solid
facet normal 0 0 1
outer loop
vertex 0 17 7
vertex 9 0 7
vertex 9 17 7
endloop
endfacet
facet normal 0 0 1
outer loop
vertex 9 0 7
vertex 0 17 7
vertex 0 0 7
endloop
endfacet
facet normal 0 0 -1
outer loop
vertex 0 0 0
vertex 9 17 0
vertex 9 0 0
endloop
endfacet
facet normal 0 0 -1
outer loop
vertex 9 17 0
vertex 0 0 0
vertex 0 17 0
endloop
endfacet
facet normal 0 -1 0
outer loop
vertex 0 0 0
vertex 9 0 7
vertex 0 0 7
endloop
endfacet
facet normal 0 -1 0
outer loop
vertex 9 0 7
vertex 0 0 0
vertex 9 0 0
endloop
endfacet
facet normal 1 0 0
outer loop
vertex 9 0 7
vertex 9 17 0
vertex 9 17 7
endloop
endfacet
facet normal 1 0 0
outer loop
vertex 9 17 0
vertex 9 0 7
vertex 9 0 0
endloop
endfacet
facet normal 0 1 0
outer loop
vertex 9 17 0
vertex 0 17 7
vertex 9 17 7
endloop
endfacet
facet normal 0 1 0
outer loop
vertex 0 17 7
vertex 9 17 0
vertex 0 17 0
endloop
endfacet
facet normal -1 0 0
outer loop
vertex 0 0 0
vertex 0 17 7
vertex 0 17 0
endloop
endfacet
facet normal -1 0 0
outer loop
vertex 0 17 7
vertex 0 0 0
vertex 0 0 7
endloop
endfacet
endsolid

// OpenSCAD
// Generated by SolidPython 1.0.1 on 2020-07-29 00:46:55


cube(size = [9, 17, 7]);
/***********************************************
*********      SolidPython code:      **********
************************************************
 
# import packages: SolidPython
from solid import *
from solid.utils import *
from itertools import chain, combinations, permutations


class Resize:

    def __init__(self, scad_file):
        self.scad_file = scad_file
        #self.scad_file = import_scad(scad_file)
        # cone/cylinder param:
        self.r1 = 0
        self.r2 = 0
        self.h = 0
        # rectangular prism param:
        self.w = 0
        self.l = 0
        # ellipse param:
        self.r = 0

    # import OpenScad code (file name corresponds to shape)


    # classify shape + parameters
    def assign(self, param1, param2, param3):
        if self.scad_file == 'cone.scad':
            self.r1 = param1
            self.r2 = param2
            self.h = param3
        elif self.scad_file == 'cylinder.scad':
            self.r1 = param1
            self.r2 = param2
            self.h = param3
        elif self.scad_file == 'rectangularPrism.scad':
            self.h = param1
            self.l = param2
            self.w = param3
        else:
            self.r = param1
            self.h = param2

    # resize parameters
    def iterate(self):
        x = range(3, 20, 2)
        i = 1
        if self.scad_file == 'cone.scad':
            tempList = list(permutations(x, 2))
            for temp in tempList:
                param1 = temp[0]
                param2 = temp[1]
                filepath = 'produced_scad_files/' + 'cone' + str(param1) + '_' + str(param2) + '_' + '.scad'
                scad_render_to_file(cylinder(h=param1, r1=param2, r2=0), filepath)

        elif self.scad_file == 'cylinder.scad':
            tempList = list(permutations(x, 3))
            for temp in tempList:
                param1 = temp[0]
                param2 = temp[1]
                filepath = 'produced_scad_files/' + 'cylinder' + str(param1) + '_' + str(param2) + '_' + '.scad'
                scad_render_to_file(cylinder(h=param1, r1=param2, r2=param2), filepath)

        elif self.scad_file == 'rectangularPrism.scad':
            tempList = list(permutations(x, 3))
            for temp in tempList:
                param1 = temp[0]
                param2 = temp[1]
                param3 = temp[2]
                filepath = 'produced_scad_files/' + 'rectangularPrism' + str(param1) + '_' + str(param2) + '_' + str(
                    param3) + '.scad'
                scad_render_to_file(cube(size=(param1, param2, param3)), filepath)

        elif self.scad_file == 'ellipse.scad':
            tempList = list(permutations(x, 4))
            for temp in tempList:
                param1 = temp[0]
                param2 = temp[1]
                param3 = temp[2]
                param4 = temp[3]
                filepath = 'produced_scad_files/' + 'ellipse' + str(param1) + '_' + str(param2) + '_' + str(param3) + '_' + str(param4) + '.scad'
                scad_render_to_file(scale([param1, param2, param3])(sphere(r=param4)), filepath)

    def render_to_scadfile(self):
        scad_render_to_file(scad, 'example.scad') 
 
************************************************/
